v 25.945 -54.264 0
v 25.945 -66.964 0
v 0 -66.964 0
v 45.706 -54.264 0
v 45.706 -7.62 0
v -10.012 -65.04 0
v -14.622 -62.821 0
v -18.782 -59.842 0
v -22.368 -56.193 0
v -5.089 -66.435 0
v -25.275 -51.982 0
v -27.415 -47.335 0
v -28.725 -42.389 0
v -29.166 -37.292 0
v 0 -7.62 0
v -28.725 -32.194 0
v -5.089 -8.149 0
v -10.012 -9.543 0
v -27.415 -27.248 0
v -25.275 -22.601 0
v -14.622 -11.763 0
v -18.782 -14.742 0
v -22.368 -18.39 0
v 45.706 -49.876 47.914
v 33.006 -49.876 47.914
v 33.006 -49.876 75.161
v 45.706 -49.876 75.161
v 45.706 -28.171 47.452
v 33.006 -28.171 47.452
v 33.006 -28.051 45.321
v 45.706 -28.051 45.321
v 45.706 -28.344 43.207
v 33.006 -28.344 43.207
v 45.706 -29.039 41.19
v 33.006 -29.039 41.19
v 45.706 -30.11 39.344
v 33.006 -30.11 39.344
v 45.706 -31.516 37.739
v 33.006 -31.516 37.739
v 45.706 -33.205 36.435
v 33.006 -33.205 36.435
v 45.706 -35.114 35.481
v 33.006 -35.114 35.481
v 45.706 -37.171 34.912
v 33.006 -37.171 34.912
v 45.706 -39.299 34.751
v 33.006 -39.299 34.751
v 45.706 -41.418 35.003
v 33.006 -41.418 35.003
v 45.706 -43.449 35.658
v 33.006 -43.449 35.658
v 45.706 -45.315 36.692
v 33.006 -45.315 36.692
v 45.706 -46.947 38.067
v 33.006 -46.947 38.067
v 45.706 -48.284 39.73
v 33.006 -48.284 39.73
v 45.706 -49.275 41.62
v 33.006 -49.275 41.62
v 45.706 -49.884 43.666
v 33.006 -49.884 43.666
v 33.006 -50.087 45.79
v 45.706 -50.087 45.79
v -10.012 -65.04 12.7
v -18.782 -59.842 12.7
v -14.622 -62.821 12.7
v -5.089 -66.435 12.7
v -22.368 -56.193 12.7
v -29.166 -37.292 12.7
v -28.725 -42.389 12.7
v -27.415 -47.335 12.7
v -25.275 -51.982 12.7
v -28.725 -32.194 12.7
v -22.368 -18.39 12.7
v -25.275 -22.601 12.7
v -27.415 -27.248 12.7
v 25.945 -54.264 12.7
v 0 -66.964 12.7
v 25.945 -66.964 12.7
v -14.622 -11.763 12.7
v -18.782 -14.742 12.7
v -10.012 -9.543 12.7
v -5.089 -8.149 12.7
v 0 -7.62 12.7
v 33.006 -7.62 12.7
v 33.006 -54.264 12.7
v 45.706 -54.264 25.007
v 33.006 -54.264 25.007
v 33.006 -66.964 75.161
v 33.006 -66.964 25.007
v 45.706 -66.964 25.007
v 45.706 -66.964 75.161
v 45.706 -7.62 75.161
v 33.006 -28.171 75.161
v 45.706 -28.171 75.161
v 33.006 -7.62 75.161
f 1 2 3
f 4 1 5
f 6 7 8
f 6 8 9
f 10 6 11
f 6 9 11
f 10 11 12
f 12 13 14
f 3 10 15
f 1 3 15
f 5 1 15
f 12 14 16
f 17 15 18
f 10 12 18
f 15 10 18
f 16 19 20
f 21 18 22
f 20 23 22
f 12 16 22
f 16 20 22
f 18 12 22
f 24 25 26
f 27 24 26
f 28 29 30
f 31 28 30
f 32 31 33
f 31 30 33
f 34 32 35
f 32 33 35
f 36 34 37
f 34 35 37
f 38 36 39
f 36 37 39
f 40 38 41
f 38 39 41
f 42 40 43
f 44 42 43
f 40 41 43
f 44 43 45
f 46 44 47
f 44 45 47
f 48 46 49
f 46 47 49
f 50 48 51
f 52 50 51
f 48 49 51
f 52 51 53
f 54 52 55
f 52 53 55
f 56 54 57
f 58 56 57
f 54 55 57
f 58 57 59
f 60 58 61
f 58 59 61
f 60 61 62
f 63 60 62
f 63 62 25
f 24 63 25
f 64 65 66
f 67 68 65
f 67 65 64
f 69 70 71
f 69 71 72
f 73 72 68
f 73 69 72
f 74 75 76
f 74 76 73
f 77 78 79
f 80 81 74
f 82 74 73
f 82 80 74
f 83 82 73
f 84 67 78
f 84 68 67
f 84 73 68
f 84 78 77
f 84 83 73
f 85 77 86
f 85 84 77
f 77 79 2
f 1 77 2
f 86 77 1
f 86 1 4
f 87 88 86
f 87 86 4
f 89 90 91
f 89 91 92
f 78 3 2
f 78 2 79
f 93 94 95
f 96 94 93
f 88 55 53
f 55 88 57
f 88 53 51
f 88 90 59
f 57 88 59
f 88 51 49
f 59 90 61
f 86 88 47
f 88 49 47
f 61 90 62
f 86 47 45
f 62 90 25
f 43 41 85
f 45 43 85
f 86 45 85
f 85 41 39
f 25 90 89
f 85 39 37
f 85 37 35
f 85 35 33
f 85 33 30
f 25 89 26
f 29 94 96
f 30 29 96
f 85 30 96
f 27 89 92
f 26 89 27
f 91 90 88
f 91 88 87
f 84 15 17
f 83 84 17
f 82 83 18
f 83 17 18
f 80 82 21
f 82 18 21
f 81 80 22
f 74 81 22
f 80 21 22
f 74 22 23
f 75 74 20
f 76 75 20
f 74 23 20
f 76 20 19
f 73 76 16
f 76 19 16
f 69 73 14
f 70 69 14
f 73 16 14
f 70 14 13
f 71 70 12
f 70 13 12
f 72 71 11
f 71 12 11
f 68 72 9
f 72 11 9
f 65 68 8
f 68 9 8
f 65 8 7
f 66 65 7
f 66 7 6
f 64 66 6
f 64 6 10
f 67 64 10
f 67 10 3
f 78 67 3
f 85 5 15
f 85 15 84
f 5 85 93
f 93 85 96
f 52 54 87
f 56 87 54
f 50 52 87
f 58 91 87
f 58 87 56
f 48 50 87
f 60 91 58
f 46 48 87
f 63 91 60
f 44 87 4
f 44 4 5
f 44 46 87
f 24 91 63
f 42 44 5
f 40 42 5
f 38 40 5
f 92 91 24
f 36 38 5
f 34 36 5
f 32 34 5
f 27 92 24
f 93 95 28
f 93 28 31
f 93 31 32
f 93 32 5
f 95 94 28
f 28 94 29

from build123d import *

# Parameters (mm, degrees)
F0_W     = 33.0062359571
F0_H     = 59.3436355703
F1_DEPTH = 12.7
F2_W     = 59.3436355703
F2_H     = 75.1609131694
F3_DEPTH = 12.7
F5_DEPTH = 12.701
F6_W     = 12.7
F6_H     = 12.3074490905
F7_DEPTH = 12.7


with BuildPart() as f1:
    # F0 (on Top) → F1 (new body)
    with BuildSketch(Plane.XY):
        with BuildLine():
            Line((0, -66.963635385), (0, -7.6199998148))
            ThreePointArc((0, -7.6199998148), (-29.1663880378, -37.2918175999), (0, -66.963635385))
        make_face()
        with Locations((16.5031179786, -37.2918175999)):
            Rectangle(F0_W, F0_H)
    extrude(amount=F1_DEPTH)

    # F2 (on face) → F3 (join)
    with BuildSketch(Plane.YZ.offset(33.0062359571)):
        with Locations((-37.2918175999, 37.5804565847)):
            Rectangle(F2_W, F2_H)
    extrude(amount=F3_DEPTH)

    # F4 (on face) → F5 (cut, through all)
    with BuildSketch(Plane(origin=(33.0062359571, 0, 0), x_dir=(0, -1, 0), z_dir=(-1, 0, 0))):
        with BuildLine():
            Line((28.1709097326, 75.1609131694), (28.1709097326, 47.4518202245))
            ThreePointArc((28.1709097326, 47.4518202245), (39.2987808247, 34.7509651719), (49.8763658106, 47.9136370122))
            Line((49.8763658106, 47.9136370122), (49.8763658106, 75.1609131694))
            Line((49.8763658106, 75.1609131694), (28.1709097326, 75.1609131694))
        make_face()
    extrude(amount=-F5_DEPTH, mode=Mode.SUBTRACT)

    # F6 (on face) → F7 (cut)
    with BuildSketch(Plane.XZ.offset(66.963635385)):
        Polygon((33.0062359571, 12.7), (25.9446389973, 12.7), (25.9446389973, 0), (45.7062359571, 0), (45.7062359571, 12.7), align=None)
        with Locations((39.3562359571, 18.8537245452)):
            Rectangle(F6_W, F6_H)
    extrude(amount=-F7_DEPTH, mode=Mode.SUBTRACT)


solid = f1.part
